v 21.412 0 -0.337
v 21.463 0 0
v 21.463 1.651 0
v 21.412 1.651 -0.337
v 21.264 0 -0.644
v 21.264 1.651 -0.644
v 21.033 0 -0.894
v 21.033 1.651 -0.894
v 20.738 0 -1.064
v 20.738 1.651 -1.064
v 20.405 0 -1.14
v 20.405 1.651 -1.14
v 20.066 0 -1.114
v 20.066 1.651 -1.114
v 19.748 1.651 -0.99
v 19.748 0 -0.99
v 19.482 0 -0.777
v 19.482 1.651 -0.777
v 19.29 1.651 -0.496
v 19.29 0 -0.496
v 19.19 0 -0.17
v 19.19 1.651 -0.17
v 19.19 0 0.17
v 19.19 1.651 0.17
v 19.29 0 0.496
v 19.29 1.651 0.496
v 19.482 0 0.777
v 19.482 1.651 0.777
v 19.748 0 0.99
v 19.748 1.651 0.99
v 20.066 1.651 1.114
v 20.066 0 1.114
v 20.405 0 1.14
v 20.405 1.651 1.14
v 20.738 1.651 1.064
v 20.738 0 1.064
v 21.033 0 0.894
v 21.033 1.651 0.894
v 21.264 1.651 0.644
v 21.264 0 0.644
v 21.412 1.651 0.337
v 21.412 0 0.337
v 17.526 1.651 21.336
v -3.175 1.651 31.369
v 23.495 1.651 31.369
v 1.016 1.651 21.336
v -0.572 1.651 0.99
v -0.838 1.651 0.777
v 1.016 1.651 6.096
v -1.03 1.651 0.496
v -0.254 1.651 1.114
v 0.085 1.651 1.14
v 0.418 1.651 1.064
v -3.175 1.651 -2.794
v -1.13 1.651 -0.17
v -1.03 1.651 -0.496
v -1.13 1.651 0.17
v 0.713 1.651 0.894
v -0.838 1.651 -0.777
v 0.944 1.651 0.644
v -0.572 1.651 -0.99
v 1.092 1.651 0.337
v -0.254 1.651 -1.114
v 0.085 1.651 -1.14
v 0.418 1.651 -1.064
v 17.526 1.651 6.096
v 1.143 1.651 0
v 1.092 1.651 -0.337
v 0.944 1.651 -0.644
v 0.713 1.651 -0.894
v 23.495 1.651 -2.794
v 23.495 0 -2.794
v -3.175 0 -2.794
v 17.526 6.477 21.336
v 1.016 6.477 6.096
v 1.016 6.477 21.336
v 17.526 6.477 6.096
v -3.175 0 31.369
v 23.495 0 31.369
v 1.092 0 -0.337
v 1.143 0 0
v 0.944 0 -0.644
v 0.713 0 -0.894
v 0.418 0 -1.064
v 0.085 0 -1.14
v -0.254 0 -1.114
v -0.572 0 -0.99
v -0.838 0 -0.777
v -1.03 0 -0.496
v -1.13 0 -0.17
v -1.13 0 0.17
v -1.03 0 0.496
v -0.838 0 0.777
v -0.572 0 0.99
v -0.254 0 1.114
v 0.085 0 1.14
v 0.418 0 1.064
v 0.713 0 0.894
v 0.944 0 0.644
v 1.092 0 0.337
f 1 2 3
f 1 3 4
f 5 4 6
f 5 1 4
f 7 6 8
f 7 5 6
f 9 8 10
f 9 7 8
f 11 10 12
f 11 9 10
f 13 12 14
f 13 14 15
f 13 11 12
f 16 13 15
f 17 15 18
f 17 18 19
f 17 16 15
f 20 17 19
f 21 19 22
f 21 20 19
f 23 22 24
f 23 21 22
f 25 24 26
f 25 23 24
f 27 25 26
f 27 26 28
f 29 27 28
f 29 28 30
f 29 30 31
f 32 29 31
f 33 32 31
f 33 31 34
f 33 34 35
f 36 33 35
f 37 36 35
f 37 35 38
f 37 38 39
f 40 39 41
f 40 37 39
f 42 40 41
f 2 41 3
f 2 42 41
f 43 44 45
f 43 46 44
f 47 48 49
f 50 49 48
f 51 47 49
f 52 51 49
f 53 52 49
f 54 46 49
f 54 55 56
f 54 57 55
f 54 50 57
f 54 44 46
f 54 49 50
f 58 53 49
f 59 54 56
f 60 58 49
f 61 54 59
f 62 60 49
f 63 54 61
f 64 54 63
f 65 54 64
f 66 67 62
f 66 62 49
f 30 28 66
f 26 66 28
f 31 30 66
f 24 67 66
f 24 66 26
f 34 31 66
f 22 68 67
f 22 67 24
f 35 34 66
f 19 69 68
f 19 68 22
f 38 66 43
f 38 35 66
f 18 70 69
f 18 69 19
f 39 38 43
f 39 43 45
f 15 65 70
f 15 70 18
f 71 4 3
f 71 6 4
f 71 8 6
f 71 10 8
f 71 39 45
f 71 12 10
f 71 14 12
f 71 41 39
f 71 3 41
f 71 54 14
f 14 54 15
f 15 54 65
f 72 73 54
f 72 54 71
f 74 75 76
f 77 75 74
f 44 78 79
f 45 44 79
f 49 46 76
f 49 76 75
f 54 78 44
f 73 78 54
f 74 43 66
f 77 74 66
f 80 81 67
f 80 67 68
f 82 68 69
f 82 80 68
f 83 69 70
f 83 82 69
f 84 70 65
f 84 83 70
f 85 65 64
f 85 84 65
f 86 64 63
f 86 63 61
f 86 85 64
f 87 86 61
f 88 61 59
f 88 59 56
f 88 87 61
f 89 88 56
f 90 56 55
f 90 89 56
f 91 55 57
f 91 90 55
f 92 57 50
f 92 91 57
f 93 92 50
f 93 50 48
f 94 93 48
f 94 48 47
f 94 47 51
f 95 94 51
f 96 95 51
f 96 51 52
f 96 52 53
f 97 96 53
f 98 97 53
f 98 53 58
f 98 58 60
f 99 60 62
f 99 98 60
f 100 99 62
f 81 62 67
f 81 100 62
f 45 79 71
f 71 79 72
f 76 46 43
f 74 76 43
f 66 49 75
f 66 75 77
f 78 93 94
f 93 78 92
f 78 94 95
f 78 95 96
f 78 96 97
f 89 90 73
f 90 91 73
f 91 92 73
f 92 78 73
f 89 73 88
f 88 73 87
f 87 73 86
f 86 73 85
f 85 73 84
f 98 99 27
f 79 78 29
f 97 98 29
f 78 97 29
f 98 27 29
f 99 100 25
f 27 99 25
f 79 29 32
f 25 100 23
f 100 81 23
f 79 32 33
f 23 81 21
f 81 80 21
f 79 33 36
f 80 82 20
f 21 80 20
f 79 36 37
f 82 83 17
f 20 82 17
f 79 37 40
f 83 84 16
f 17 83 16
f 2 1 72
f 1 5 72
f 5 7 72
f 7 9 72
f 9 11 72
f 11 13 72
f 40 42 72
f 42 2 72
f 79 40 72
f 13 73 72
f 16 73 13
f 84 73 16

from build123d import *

# Parameters (mm, degrees)
SKETCH1_W           = 26.67
SKETCH1_H           = 34.163
SKETCH1_R           = 1.143
BOSS_EXTRUDE1_DEPTH = 1.651
SKETCH2_W           = 16.51
SKETCH2_H           = 15.24
BOSS_EXTRUDE2_DEPTH = 4.826


with BuildPart() as part:
    # Sketch1 → Boss-Extrude1 (new body)
    with BuildSketch(Plane(origin=(0, 0, 0), x_dir=(1, 0, 0), z_dir=(0, 1, 0))):
        with Locations((10.16, -14.2875)):
            Rectangle(SKETCH1_W, SKETCH1_H)
        Circle(SKETCH1_R, mode=Mode.SUBTRACT)
        with Locations((20.32, 0)):
            Circle(SKETCH1_R, mode=Mode.SUBTRACT)
    extrude(amount=BOSS_EXTRUDE1_DEPTH)

    # Sketch2 → Boss-Extrude2 (add)
    with BuildSketch(Plane(origin=(0, 1.651, 0), x_dir=(1, 0, 0), z_dir=(0, 1, 0))):
        with Locations((9.271, -13.716)):
            Rectangle(SKETCH2_W, SKETCH2_H)
    extrude(amount=BOSS_EXTRUDE2_DEPTH)


solid = part.part
